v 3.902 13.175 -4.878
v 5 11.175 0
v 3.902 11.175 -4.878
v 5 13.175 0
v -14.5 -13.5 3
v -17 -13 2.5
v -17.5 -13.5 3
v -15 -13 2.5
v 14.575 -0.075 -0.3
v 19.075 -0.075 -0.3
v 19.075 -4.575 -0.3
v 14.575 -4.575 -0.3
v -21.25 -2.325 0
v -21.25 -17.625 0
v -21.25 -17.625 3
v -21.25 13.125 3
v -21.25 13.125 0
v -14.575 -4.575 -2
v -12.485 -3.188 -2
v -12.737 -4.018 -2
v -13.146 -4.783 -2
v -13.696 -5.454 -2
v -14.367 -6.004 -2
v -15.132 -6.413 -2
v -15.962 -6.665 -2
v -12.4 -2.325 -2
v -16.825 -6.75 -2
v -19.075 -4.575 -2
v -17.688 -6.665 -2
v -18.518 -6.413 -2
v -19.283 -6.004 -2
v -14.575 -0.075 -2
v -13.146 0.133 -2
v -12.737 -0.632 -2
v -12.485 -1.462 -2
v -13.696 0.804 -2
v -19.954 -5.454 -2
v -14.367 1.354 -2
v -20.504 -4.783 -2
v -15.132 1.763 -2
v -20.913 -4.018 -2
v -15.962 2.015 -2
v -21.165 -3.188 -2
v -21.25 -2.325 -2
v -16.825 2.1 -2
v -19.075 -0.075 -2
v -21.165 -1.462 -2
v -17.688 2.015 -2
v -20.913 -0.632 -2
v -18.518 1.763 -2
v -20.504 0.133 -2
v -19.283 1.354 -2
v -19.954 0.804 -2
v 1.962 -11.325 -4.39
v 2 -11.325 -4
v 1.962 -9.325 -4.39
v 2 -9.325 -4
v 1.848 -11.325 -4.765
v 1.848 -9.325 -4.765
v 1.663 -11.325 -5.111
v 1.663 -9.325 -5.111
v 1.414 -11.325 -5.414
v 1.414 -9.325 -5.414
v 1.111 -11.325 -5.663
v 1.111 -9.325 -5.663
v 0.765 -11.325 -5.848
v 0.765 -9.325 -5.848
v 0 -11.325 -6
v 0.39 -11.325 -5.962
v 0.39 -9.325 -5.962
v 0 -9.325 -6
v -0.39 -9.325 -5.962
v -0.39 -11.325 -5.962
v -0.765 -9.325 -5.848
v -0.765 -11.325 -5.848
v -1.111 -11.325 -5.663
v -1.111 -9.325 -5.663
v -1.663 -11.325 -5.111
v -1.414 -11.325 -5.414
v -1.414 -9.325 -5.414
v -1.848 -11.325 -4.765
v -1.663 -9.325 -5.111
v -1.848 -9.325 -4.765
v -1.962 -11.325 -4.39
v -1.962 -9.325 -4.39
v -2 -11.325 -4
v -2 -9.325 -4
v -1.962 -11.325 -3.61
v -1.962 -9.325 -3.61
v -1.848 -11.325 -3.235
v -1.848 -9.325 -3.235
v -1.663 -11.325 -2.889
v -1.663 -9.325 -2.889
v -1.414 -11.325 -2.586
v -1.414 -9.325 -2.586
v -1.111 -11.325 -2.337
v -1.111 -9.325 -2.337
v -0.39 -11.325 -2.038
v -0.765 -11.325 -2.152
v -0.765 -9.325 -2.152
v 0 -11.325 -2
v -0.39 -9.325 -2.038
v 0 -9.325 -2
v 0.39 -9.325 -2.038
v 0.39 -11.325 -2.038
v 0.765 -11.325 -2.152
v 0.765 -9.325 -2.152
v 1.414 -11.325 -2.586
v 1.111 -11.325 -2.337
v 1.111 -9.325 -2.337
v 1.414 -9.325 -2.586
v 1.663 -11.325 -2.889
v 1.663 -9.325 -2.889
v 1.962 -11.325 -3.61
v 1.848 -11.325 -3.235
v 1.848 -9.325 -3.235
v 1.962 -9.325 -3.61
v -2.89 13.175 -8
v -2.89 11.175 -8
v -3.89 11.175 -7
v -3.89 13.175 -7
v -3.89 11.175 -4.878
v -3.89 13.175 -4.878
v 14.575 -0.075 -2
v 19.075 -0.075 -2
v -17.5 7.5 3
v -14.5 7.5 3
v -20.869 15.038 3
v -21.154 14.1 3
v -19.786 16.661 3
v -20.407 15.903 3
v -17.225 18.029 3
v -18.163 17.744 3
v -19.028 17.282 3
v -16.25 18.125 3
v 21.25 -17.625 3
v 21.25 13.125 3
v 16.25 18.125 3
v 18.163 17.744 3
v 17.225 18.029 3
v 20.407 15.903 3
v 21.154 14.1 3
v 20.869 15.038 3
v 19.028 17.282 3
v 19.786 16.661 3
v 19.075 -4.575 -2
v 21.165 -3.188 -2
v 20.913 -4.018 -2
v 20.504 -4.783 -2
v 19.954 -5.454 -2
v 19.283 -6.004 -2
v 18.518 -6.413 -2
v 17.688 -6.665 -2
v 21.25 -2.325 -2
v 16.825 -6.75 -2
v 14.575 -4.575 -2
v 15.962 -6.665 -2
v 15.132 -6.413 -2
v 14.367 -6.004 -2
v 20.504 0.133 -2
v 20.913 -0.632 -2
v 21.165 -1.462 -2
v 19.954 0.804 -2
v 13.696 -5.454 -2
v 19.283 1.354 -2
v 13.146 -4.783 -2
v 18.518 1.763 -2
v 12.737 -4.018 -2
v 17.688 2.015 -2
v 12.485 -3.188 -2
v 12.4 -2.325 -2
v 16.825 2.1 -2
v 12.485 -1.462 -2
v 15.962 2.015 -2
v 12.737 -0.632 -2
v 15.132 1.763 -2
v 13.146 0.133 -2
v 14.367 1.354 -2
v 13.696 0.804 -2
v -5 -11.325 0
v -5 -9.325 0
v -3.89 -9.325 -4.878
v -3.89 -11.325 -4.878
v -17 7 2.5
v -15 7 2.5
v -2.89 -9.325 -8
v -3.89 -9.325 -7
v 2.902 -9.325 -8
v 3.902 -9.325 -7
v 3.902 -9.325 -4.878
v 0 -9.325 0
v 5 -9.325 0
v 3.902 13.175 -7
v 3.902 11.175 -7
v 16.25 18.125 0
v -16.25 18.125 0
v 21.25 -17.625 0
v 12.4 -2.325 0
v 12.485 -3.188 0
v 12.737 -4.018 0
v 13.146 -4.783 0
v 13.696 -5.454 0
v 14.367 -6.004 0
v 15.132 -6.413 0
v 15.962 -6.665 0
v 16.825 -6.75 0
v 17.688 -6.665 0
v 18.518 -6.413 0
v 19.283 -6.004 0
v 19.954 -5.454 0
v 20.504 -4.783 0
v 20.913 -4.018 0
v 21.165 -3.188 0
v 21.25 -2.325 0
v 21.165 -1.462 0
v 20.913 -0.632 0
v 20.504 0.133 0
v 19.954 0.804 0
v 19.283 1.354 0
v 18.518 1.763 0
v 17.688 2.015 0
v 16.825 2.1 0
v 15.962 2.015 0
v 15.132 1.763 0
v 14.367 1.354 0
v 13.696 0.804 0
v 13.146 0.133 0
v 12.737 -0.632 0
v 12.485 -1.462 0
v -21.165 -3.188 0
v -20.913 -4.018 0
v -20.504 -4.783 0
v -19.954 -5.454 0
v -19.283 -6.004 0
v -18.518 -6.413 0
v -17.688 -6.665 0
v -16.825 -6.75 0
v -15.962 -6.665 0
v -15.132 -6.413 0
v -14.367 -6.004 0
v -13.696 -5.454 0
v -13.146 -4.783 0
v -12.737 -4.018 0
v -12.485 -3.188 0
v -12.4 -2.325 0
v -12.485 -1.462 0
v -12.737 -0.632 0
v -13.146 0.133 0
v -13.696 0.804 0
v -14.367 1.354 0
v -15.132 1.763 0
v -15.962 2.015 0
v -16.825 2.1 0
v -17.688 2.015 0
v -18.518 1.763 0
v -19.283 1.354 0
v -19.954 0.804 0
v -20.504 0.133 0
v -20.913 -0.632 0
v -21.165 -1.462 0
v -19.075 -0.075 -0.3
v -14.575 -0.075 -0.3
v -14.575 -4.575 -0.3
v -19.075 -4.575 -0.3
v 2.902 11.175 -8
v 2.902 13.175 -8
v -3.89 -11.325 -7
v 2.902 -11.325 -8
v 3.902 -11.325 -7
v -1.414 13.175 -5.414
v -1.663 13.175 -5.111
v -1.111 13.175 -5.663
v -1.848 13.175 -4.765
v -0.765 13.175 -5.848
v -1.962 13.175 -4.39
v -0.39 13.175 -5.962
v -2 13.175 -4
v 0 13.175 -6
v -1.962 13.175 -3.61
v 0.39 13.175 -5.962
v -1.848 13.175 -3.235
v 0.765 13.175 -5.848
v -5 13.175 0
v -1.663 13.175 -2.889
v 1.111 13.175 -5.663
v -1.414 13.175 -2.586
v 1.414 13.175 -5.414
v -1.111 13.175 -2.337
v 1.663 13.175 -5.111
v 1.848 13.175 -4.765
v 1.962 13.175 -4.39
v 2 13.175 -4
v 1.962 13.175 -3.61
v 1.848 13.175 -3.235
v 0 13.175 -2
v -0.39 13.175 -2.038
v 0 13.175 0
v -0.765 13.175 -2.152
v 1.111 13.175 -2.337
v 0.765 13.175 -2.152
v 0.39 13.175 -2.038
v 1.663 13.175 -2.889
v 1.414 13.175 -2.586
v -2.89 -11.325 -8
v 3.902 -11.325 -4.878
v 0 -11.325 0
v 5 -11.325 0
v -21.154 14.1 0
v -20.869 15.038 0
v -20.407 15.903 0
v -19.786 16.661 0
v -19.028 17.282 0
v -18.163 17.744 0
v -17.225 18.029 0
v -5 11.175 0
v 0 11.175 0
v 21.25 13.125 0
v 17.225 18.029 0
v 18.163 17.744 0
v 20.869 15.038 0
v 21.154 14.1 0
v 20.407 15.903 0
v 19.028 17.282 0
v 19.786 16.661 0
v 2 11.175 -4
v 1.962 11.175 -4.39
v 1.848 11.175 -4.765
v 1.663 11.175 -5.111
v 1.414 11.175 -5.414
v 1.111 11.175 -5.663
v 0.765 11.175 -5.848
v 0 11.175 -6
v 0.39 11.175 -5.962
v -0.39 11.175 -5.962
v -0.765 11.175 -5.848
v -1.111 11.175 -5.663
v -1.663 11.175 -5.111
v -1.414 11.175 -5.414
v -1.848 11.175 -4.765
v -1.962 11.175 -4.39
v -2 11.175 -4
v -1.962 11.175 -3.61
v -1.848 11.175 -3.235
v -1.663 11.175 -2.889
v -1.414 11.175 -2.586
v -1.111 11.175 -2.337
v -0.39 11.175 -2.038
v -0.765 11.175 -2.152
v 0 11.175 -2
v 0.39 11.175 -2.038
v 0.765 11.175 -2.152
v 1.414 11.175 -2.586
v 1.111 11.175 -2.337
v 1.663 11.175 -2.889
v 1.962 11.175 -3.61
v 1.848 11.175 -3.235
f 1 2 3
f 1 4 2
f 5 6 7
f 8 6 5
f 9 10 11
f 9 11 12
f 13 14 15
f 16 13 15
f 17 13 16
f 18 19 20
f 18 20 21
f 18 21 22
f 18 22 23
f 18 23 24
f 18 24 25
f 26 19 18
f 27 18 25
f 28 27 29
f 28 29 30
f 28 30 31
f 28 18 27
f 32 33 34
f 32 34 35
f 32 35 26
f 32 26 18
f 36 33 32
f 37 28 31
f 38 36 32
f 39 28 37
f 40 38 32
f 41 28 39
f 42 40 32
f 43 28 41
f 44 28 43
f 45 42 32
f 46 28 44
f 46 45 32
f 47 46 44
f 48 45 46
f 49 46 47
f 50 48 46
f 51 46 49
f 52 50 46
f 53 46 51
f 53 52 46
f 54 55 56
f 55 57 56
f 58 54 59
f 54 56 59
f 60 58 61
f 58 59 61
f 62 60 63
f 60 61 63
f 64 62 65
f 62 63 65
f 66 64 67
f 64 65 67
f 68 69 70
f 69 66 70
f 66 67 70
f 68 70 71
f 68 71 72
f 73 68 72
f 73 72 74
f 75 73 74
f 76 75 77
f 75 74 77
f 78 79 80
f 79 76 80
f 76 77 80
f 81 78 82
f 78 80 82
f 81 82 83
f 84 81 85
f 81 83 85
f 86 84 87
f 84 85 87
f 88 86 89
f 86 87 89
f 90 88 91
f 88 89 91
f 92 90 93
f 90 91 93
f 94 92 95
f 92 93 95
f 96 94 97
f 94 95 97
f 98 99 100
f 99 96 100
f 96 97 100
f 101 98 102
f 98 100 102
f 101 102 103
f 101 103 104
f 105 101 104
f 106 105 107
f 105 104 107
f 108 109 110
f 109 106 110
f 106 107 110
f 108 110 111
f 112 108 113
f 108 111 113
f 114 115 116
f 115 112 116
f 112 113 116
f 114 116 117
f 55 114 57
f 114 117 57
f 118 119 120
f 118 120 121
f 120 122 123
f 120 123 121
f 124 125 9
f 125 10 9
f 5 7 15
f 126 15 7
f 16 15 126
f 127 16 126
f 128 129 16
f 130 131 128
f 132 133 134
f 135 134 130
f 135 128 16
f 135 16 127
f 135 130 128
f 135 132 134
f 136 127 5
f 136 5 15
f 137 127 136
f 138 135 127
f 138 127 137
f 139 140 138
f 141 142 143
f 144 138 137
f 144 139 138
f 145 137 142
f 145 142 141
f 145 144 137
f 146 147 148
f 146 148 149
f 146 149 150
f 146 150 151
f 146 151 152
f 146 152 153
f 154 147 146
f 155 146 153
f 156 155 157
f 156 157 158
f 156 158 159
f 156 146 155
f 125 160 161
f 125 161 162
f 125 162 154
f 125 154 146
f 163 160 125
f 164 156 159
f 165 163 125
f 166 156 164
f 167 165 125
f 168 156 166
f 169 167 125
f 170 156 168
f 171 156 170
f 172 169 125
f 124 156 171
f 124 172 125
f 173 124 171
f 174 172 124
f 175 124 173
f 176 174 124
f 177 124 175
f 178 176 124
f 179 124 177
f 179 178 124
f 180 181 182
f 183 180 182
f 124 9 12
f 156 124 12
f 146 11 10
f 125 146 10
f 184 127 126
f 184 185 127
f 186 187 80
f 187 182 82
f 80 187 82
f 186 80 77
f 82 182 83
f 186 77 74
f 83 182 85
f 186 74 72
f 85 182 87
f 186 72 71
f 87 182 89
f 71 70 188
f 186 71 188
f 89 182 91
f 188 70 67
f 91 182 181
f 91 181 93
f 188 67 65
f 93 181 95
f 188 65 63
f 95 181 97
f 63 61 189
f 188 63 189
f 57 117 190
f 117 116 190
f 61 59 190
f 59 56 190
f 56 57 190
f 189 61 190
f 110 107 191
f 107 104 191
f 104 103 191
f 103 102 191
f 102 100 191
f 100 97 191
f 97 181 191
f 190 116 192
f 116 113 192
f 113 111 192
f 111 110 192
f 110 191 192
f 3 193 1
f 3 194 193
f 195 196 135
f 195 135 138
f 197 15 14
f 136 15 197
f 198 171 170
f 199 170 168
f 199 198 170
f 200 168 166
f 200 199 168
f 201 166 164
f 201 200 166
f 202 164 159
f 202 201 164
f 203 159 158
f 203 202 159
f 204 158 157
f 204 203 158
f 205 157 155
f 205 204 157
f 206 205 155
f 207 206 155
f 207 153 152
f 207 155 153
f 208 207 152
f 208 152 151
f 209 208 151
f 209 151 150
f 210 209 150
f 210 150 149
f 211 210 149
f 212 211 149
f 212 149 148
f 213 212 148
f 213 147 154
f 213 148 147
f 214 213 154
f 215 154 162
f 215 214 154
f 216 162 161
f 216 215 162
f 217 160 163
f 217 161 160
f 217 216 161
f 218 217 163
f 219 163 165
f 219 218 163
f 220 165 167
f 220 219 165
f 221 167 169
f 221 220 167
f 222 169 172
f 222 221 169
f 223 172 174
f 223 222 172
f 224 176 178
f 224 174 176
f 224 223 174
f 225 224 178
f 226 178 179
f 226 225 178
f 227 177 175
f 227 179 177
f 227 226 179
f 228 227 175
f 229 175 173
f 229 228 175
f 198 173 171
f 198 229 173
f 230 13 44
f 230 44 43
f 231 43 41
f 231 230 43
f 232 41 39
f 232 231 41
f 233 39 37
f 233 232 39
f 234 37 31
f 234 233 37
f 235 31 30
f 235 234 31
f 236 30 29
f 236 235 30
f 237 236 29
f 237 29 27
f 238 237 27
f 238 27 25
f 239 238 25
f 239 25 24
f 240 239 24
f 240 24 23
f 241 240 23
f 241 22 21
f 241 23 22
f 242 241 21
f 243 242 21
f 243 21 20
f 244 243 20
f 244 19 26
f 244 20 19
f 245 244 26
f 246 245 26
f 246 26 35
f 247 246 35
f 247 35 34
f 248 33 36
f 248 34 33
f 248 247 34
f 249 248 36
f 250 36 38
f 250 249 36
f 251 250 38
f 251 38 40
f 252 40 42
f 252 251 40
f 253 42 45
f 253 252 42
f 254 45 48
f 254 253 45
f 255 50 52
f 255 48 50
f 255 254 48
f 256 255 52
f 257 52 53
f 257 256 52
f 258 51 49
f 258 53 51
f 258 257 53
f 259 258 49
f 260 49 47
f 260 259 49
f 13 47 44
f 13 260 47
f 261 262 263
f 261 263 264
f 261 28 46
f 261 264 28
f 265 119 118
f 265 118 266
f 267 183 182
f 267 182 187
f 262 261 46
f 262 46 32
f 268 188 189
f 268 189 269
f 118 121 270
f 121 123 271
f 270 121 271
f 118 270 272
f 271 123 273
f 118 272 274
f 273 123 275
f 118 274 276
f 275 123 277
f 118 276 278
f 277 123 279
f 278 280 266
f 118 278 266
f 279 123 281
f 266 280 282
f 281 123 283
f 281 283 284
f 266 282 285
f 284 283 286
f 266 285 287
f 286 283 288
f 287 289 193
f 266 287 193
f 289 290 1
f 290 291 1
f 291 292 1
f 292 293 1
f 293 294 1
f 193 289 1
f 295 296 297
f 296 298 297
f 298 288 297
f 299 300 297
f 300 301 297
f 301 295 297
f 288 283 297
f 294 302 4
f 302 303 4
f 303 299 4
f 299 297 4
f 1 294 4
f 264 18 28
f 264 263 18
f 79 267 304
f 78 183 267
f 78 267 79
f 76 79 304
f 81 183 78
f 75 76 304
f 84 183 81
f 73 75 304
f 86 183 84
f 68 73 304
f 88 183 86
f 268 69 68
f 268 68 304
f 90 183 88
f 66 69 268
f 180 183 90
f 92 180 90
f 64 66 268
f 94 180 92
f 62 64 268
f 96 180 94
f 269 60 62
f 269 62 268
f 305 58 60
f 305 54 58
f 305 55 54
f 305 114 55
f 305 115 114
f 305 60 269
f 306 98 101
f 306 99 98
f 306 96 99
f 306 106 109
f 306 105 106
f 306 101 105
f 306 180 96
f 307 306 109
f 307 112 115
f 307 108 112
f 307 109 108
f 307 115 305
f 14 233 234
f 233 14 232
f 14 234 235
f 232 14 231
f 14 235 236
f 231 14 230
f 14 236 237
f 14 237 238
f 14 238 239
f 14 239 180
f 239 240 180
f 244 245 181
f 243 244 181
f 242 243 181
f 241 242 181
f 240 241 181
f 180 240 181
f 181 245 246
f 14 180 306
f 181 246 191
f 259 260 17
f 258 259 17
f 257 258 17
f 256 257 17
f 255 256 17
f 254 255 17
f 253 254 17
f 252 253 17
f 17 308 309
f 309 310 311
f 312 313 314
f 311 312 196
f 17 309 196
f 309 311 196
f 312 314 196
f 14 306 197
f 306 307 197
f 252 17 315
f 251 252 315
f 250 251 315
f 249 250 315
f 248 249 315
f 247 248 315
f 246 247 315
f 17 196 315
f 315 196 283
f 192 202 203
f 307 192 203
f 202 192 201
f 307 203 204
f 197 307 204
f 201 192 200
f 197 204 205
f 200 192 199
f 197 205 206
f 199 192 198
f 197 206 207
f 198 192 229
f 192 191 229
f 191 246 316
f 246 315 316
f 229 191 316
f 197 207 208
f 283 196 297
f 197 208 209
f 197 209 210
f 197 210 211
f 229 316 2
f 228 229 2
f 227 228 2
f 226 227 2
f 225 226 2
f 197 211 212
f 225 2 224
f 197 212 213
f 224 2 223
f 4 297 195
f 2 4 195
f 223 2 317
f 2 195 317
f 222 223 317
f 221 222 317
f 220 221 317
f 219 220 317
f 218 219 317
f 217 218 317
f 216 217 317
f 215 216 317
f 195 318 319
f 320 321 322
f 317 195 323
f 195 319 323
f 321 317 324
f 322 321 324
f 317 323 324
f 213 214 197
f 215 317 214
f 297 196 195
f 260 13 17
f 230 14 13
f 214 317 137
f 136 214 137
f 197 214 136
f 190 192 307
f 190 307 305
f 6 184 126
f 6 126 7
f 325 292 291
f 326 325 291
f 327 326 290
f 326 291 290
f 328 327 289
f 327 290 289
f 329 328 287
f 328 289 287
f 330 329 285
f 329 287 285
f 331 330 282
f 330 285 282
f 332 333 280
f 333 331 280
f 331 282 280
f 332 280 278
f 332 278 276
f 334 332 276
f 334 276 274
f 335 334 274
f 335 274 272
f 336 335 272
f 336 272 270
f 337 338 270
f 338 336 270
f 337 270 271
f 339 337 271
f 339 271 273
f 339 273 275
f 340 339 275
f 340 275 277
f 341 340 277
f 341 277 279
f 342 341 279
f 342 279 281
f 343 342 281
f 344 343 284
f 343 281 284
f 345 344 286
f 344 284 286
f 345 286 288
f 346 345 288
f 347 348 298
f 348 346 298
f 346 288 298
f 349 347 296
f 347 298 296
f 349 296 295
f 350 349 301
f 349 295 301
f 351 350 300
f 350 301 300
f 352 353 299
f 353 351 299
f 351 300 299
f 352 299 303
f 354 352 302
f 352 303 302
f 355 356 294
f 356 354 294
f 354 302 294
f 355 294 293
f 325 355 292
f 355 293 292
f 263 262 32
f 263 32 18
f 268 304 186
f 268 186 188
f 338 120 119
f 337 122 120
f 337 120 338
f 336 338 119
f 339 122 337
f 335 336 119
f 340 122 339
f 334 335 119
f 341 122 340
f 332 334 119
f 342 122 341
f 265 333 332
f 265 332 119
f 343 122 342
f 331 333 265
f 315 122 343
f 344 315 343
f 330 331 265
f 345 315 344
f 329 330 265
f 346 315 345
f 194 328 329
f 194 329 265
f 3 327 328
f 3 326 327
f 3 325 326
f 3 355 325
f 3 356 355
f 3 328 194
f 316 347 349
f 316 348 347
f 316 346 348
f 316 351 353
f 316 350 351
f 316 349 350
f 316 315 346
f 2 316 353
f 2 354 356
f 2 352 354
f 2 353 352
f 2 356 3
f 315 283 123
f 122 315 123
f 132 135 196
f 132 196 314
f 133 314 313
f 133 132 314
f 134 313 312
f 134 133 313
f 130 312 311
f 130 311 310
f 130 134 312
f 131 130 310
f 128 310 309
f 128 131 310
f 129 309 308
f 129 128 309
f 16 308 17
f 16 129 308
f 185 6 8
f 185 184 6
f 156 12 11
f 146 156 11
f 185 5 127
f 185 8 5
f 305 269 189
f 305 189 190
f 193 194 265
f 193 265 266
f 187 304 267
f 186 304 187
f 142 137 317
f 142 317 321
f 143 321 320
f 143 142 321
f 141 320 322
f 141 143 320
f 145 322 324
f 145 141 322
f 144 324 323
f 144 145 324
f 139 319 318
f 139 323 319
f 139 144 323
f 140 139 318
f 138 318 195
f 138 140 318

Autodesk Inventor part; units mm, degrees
ref_plane "YZ Plane" through (0, 0, 0) normal (1, 0, 0) x (0, 1, 0)
ref_plane "XZ Plane" through (0, 0, 0) normal (0, 1, 0) x (-1, 0, 0)
sketch "스케치1" plane through (0, 0, 0) normal (0, 0, 1) x (1, 0, 0)
  line L0 (-21.25, 18.125) -> (21.25, 18.125)
  line L1 (21.25, 18.125) -> (21.25, -18.125)
  line L2 (21.25, -18.125) -> (-21.25, -18.125)
  line L3 (-21.25, -18.125) -> (-21.25, 18.125)
  line L4 (-21.25, 18.125) -> (21.25, -18.125) construction
  line L5 (21.25, 18.125) -> (-21.25, -18.125) construction
  point P0 (0, 0)
  dimension "d0" = 42.5
  dimension "d1" = 36.25
extrude "돌출1" add sketch "스케치1" along normal blind 3
fillet "모깎기1" radius 5 2 edges at (21.25, 18.125, 1.5) (-21.25, 18.125, 1.5)
ref_plane "작업 평면1" through (-21.25, -9.325, 0) normal (0, -1, 0) x (1, 0, 0)
sketch "스케치2" plane through (-21.25, -9.325, 0) normal (0, -1, 0) x (1, 0, 0)
  line L0 (21.25, 0) -> (21.25, -4)
  circle A0 centre (21.25, -4) radius 2
  circle A1 centre (21.25, -4) radius 4
  line L1 (21.25, 0) -> (26.25, 0)
  line L2 (0, 0) -> (42.5, 0) construction
  line L3 (26.25, 0) -> (25.1524, -4.878)
  line L4 (21.25, 0) -> (16.25, 0)
  line L5 (16.25, 0) -> (17.4292, -5.184)
  dimension "d6" = 4
  dimension "d7" = 4
  dimension "d8" = 8
  dimension "d9" = 10
extrude "돌출2" add sketch "스케치2" along normal blind 2 contours L1 L3 A1 | A1 L5 | A1 L5 L4 picked at (20.9261, -0.7066)
pattern_linear "직사각형 패턴1" count 2 spacing 22.5 along (0, 1, 0) of "돌출2"
sketch "스케치3" plane through (0, 0, 0) normal (0, 0, -1) x (-1, 0, 0)
  circle A0 centre (16.825, -2.325) radius 4.425
  line L0 (21.25, -18.125) -> (-21.25, -18.125) projected
  line L1 (0, 0) -> (0, 4.3779)
  circle A1 centre (-16.825, -2.325) radius 4.425
  line L2 (21.25, 13.125) -> (21.25, -18.125) projected
  line L3 (-19.075, -0.075) -> (-14.575, -0.075)
  line L4 (-14.575, -0.075) -> (-14.575, -4.575)
  line L5 (-14.575, -4.575) -> (-19.075, -4.575)
  line L6 (-19.075, -4.575) -> (-19.075, -0.075)
  line L7 (-19.075, -0.075) -> (-14.575, -4.575) construction
  line L8 (-14.575, -0.075) -> (-19.075, -4.575) construction
  line L9 (14.575, -4.575) -> (19.075, -4.575)
  line L10 (19.075, -4.575) -> (19.075, -0.075)
  line L11 (19.075, -0.075) -> (14.575, -0.075)
  line L12 (14.575, -0.075) -> (14.575, -4.575)
  line L13 (14.575, -4.575) -> (19.075, -0.075) construction
  line L14 (19.075, -4.575) -> (14.575, -0.075) construction
  dimension "d16" = 15.8
  dimension "d17" = 33.65
  dimension "d18" = 4.5
  dimension "d19" = 4.5
  dimension "d20" = 4.5
  dimension "d21" = 4.5
extrude "돌출3" add sketch "스케치3" along normal blind 2
sketch "스케치4" plane through (0, 0, 3) normal (0, 0, 1) x (1, 0, 0)
  line L0 (-21.25, -18.125) -> (21.25, -18.125) projected
  line L1 (21.25, -18.125) -> (21.25, 13.125) projected
  line L2 (-21.25, 13.125) -> (-21.25, -18.125) projected
  line L3 (-21.25, -17.625) -> (21.25, -17.625)
  point P0 (0, 0)
  dimension "d24" = 0.5
extrude "돌출4" cut sketch "스케치4" against normal blind 3
sketch "스케치5" plane through (0, 0, 3) normal (0, 0, 1) x (1, 0, 0)
  line L0 (-17, 7) -> (-15, 7)
  line L1 (-15, 7) -> (-15, -13)
  line L2 (-15, -13) -> (-17, -13)
  line L3 (-17, -13) -> (-17, 7)
  line L4 (-17, 7) -> (-15, -13) construction
  line L5 (-15, 7) -> (-17, -13) construction
  point P0 (0, 0)
  point P1 (-16, -3)
  dimension "d27" = 2
  dimension "d28" = 20
  dimension "d32" = 3
  dimension "d37" = 16
extrude "돌출5" cut sketch "스케치5" against normal blind 0.5
chamfer "모따기1" distance 0.5 angle 45 4 edges at (-17, -3, 3) (-16, 7, 3) (-15, -3, 3) (-16, -13, 3)
sketch "스케치6" plane through (0, 0, 0) normal (0, 0, -1) x (-1, 0, 0)
  line L0 (14.575, -4.575) -> (19.075, -4.575) projected
  line L1 (19.075, -4.575) -> (19.075, -0.075) projected
  line L2 (19.075, -0.075) -> (14.575, -0.075) projected
  line L3 (14.575, -0.075) -> (14.575, -4.575) projected
  line L4 (-19.075, -0.075) -> (-19.075, -4.575) projected
  line L5 (-19.075, -4.575) -> (-14.575, -4.575) projected
  line L6 (-14.575, -4.575) -> (-14.575, -0.075) projected
  line L7 (-14.575, -0.075) -> (-19.075, -0.075) projected
  point P0 (0, 0)
extrude "돌출6" add sketch "스케치6" along normal blind 0.3
sketch "스케치7" plane through (-5, 11.175, 0) normal (0, -1, 0) x (1, 0, 0)
  arc A0 (1.1792, -5.184) -> (8.9024, -4.878) centre (5, -4) ccw projected
  line L0 (8.9024, -4.878) -> (1.1096, -4.878)
  line L1 (1.1096, -4.878) -> (1.1096, -8)
  line L2 (1.1096, -8) -> (8.9024, -8)
  line L3 (8.9024, -8) -> (8.9024, -4.878)
  line L4 (0, 0) -> (1.1792, -5.184) projected
  point P0 (5, 0)
  point P1 (5, -8)
extrude "돌출7" add sketch "스케치7" against normal blind 2 contours A0 L2 L1 L4 | A0 L3 L2
pattern_linear "직사각형 패턴2" count 2 spacing 22.5 along (0, -1, 0) of "돌출7"
chamfer "모따기2" distance 1 angle 45 4 edges at (3.9024, 12.175, -8) (-3.8904, 12.175, -8) (3.9024, -10.325, -8) (-3.8904, -10.325, -8)
properties part number "버튼 스위치 상단"
